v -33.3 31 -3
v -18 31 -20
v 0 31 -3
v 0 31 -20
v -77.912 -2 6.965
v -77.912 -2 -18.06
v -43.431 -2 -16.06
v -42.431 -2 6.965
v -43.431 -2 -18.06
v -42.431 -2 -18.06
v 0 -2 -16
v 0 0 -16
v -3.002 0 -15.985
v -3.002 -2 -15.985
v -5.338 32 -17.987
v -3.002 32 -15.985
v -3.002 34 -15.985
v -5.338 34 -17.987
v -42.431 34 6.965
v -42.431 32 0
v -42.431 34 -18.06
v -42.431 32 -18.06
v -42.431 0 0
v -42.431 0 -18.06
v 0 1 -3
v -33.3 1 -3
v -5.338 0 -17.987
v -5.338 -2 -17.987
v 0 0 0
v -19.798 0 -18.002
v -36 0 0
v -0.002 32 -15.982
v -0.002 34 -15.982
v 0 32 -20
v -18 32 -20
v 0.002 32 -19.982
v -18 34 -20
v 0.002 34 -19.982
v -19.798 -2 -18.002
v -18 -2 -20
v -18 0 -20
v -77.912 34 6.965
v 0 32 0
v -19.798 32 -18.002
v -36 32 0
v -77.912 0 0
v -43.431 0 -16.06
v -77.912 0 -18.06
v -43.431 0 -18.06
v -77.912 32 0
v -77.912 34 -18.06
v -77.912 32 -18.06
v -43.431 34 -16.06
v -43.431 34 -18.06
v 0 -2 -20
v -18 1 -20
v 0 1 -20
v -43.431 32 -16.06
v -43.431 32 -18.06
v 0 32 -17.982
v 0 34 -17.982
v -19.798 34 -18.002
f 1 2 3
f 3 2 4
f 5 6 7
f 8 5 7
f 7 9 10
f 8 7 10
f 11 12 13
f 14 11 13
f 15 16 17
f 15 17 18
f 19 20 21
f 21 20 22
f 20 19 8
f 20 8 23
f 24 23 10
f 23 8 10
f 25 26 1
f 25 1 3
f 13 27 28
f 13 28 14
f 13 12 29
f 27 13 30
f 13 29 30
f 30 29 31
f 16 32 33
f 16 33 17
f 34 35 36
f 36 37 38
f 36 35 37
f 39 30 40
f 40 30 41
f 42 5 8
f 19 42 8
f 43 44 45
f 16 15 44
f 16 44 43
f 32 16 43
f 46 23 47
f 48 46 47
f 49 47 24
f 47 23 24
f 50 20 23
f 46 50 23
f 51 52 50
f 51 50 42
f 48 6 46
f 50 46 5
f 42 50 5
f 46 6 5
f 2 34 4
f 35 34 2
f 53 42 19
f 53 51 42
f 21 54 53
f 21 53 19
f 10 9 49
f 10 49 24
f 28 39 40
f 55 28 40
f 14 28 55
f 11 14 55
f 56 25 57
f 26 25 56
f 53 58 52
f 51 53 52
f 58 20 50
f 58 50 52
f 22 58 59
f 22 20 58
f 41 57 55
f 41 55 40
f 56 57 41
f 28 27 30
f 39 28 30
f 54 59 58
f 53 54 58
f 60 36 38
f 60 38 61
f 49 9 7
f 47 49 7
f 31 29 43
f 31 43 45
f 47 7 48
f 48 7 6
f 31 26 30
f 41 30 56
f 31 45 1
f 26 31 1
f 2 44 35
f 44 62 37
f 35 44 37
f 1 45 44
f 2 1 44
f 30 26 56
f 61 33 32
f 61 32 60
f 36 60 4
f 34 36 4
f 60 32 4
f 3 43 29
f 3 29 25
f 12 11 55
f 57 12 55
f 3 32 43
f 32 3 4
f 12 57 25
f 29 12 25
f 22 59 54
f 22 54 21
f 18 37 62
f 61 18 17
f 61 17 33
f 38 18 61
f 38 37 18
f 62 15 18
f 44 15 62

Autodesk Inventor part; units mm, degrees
ref_plane "YZ Plane" through (0, 0, 0) normal (1, 0, 0) x (0, 1, 0)
ref_plane "XZ Plane" through (0, 0, 0) normal (0, 1, 0) x (-1, 0, 0)
ref_plane "XY Plane" through (0, 0, 0) normal (0, 0, 1) x (1, 0, 0)
sketch "Эскиз1" plane through (0, 0, 0) normal (0, 1, 0) x (-1, 0, 0)
  line L0 (0, 0) -> (36, 0)
  line L1 (36, 0) -> (36, -40)
  line L2 (36, -40) -> (0, -40)
  line L3 (0, -40) -> (0, 0)
  dimension "d0" = 36
  dimension "d1" = 40
extrude "Выдавливание1" add sketch "Эскиз1" along normal blind 1
sketch "Эскиз2" plane through (0, 1, 0) normal (0, 1, 0) x (1, 0, 0)
  line L0 (-36, 40) -> (-36, 0) projected
  line L1 (0, 0) -> (-36, 0)
  line L2 (-36, 0) -> (-36, 3)
  line L3 (-36, 3) -> (0, 3)
  line L4 (0, 3) -> (0, 0)
  dimension "d4" = 3
extrude "Выдавливание2" add sketch "Эскиз2" along normal blind 30
sketch "Эскиз3" plane through (0, 31, 0) normal (0, 1, 0) x (1, 0, 0)
  line L0 (0, 0) -> (0, 40) projected
  line L1 (0, 0) -> (-36, 0)
  line L2 (-36, 0) -> (-36, 40)
  line L3 (-36, 40) -> (0, 40)
  line L4 (0, 40) -> (0, 0)
extrude "Выдавливание3" add sketch "Эскиз3" along normal blind 1
sketch "Эскиз4" plane through (0, 32, 0) normal (0, 1, 0) x (1, 0, 0)
  line L0 (-36, 40) -> (-36, 0) projected
  line L1 (-36, 0) -> (0, 40)
  line L2 (0, 40) -> (0, 20)
  line L3 (0, 20) -> (-18, 20)
  line L4 (0, 40) -> (-36, 40) projected
  line L5 (-36, 40) -> (0, 40)
  point P0 (0, 0)
extrude "Выдавливание4" cut sketch "Эскиз4" against normal blind 100
sketch "Эскиз6" plane through (0, 32, 0) normal (0, 1, 0) x (1, 0, 0)
  line L0 (0.002, 19.9819) -> (0, 17.9819)
  line L1 (0, 0) -> (0, 20) projected
  line L2 (0, 17.9819) -> (-19.7984, 18.0018)
  line L3 (-18, 20) -> (-36, 0) projected
  line L4 (-18, 20) -> (-19.7984, 18.0018)
  line L5 (-18, 20) -> (0.002, 19.9819)
  line L6 (0, 17.9819) -> (-0.002, 15.9819)
  line L7 (-0.002, 15.9819) -> (-3.002, 15.9849)
  line L8 (-3.002, 15.9849) -> (-5.3377, 17.9873)
  point P0 (0, 19.9819)
  dimension "d11" = 2
  dimension "d12" = 2
  dimension "d13" = 3
extrude "Выдавливание5" add sketch "Эскиз6" along normal blind 2
sketch "Эскиз7" plane through (0, 0, 0) normal (0, -1, 0) x (1, 0, 0)
  line L0 (0, -20) -> (0, -16)
  line L1 (0, -16) -> (0, -18)
  line L2 (0, -3) -> (0, -20) projected
  line L3 (-5.3377, -17.9873) -> (-19.7984, -18.0018) projected
  line L4 (0, -18) -> (-19.7984, -18.0018)
  line L5 (-19.7984, -18.0018) -> (-18, -20)
  line L6 (-18, -20) -> (0, -20)
  line L7 (-0.002, -15.9819) -> (-3.002, -15.9849) projected
  line L8 (0, -16) -> (-3.002, -15.9849)
  line L9 (-5.3377, -17.9873) -> (-3.002, -15.9849) projected
  line L10 (-3.002, -15.9849) -> (-5.3377, -17.9873)
  point P0 (0, 0)
  dimension "d16" = 4
  dimension "d17" = 2
extrude "Выдавливание6" add sketch "Эскиз7" along normal blind 2 contours L6 L5 L4 L0 | L4 L3 L9 L8 L0
sketch "Эскиз8" plane through (0, 32, 0) normal (0, 1, 0) x (1, 0, 0)
  line L0 (-42.4309, 0) -> (-77.912, 0)
  line L1 (-77.912, 0) -> (-77.912, 18.0603)
  line L2 (-77.912, 18.0603) -> (-42.4309, 18.0603)
  line L3 (-42.4309, 18.0603) -> (-42.4309, 0)
  line L4 (-42.4309, 0) -> (-77.912, 0)
  line L5 (-77.912, 0) -> (-77.912, -6.9654)
  line L6 (-77.912, -6.9654) -> (-42.4309, -6.9654)
  line L7 (-42.4309, -6.9654) -> (-42.4309, 0)
  line L8 (-42.4309, 18.0603) -> (-43.4309, 18.0603)
  line L9 (-43.4309, 18.0603) -> (-43.4309, 16.0603)
  line L10 (-43.4309, 16.0603) -> (-77.912, 18.0603)
  point P0 (0, 0)
  dimension "d20" = 1
  dimension "d21" = 2
extrude "Выдавливание7" add sketch "Эскиз8" along normal blind 2 and the other way blind 34 contours L7 L6 L5 L0 | L0 L1 L10 L9 L2 L3
sketch "Эскиз9" plane through (-42.4309, -2, -18.0603) normal (1, 0, 0) x (0, 0, -1)
  line L0 (-18.0603, 34) -> (-0.0784, 34) projected
  line L1 (-0.0585, 34) -> (-18.0603, 34)
  line L2 (-18.0603, 2) -> (-2.0603, 2) projected
  line L3 (-18.0603, 34) -> (-18.0603, 2)
  line L4 (-18.0603, 2) -> (-0.0585, 2)
  line L5 (-0.0585, 2) -> (-0.0585, 34)
  line L6 (-0.0784, 34) -> (12.151, 34)
  line L7 (12.151, 34) -> (12.151, 2)
  line L8 (12.151, 2) -> (-0.0784, 2)
  line L9 (-0.0784, 2) -> (-0.0784, 34)
  point P0 (-0.0585, 34)
extrude "Выдавливание8" cut sketch "Эскиз9" against normal blind 40
properties part number "akkum"
